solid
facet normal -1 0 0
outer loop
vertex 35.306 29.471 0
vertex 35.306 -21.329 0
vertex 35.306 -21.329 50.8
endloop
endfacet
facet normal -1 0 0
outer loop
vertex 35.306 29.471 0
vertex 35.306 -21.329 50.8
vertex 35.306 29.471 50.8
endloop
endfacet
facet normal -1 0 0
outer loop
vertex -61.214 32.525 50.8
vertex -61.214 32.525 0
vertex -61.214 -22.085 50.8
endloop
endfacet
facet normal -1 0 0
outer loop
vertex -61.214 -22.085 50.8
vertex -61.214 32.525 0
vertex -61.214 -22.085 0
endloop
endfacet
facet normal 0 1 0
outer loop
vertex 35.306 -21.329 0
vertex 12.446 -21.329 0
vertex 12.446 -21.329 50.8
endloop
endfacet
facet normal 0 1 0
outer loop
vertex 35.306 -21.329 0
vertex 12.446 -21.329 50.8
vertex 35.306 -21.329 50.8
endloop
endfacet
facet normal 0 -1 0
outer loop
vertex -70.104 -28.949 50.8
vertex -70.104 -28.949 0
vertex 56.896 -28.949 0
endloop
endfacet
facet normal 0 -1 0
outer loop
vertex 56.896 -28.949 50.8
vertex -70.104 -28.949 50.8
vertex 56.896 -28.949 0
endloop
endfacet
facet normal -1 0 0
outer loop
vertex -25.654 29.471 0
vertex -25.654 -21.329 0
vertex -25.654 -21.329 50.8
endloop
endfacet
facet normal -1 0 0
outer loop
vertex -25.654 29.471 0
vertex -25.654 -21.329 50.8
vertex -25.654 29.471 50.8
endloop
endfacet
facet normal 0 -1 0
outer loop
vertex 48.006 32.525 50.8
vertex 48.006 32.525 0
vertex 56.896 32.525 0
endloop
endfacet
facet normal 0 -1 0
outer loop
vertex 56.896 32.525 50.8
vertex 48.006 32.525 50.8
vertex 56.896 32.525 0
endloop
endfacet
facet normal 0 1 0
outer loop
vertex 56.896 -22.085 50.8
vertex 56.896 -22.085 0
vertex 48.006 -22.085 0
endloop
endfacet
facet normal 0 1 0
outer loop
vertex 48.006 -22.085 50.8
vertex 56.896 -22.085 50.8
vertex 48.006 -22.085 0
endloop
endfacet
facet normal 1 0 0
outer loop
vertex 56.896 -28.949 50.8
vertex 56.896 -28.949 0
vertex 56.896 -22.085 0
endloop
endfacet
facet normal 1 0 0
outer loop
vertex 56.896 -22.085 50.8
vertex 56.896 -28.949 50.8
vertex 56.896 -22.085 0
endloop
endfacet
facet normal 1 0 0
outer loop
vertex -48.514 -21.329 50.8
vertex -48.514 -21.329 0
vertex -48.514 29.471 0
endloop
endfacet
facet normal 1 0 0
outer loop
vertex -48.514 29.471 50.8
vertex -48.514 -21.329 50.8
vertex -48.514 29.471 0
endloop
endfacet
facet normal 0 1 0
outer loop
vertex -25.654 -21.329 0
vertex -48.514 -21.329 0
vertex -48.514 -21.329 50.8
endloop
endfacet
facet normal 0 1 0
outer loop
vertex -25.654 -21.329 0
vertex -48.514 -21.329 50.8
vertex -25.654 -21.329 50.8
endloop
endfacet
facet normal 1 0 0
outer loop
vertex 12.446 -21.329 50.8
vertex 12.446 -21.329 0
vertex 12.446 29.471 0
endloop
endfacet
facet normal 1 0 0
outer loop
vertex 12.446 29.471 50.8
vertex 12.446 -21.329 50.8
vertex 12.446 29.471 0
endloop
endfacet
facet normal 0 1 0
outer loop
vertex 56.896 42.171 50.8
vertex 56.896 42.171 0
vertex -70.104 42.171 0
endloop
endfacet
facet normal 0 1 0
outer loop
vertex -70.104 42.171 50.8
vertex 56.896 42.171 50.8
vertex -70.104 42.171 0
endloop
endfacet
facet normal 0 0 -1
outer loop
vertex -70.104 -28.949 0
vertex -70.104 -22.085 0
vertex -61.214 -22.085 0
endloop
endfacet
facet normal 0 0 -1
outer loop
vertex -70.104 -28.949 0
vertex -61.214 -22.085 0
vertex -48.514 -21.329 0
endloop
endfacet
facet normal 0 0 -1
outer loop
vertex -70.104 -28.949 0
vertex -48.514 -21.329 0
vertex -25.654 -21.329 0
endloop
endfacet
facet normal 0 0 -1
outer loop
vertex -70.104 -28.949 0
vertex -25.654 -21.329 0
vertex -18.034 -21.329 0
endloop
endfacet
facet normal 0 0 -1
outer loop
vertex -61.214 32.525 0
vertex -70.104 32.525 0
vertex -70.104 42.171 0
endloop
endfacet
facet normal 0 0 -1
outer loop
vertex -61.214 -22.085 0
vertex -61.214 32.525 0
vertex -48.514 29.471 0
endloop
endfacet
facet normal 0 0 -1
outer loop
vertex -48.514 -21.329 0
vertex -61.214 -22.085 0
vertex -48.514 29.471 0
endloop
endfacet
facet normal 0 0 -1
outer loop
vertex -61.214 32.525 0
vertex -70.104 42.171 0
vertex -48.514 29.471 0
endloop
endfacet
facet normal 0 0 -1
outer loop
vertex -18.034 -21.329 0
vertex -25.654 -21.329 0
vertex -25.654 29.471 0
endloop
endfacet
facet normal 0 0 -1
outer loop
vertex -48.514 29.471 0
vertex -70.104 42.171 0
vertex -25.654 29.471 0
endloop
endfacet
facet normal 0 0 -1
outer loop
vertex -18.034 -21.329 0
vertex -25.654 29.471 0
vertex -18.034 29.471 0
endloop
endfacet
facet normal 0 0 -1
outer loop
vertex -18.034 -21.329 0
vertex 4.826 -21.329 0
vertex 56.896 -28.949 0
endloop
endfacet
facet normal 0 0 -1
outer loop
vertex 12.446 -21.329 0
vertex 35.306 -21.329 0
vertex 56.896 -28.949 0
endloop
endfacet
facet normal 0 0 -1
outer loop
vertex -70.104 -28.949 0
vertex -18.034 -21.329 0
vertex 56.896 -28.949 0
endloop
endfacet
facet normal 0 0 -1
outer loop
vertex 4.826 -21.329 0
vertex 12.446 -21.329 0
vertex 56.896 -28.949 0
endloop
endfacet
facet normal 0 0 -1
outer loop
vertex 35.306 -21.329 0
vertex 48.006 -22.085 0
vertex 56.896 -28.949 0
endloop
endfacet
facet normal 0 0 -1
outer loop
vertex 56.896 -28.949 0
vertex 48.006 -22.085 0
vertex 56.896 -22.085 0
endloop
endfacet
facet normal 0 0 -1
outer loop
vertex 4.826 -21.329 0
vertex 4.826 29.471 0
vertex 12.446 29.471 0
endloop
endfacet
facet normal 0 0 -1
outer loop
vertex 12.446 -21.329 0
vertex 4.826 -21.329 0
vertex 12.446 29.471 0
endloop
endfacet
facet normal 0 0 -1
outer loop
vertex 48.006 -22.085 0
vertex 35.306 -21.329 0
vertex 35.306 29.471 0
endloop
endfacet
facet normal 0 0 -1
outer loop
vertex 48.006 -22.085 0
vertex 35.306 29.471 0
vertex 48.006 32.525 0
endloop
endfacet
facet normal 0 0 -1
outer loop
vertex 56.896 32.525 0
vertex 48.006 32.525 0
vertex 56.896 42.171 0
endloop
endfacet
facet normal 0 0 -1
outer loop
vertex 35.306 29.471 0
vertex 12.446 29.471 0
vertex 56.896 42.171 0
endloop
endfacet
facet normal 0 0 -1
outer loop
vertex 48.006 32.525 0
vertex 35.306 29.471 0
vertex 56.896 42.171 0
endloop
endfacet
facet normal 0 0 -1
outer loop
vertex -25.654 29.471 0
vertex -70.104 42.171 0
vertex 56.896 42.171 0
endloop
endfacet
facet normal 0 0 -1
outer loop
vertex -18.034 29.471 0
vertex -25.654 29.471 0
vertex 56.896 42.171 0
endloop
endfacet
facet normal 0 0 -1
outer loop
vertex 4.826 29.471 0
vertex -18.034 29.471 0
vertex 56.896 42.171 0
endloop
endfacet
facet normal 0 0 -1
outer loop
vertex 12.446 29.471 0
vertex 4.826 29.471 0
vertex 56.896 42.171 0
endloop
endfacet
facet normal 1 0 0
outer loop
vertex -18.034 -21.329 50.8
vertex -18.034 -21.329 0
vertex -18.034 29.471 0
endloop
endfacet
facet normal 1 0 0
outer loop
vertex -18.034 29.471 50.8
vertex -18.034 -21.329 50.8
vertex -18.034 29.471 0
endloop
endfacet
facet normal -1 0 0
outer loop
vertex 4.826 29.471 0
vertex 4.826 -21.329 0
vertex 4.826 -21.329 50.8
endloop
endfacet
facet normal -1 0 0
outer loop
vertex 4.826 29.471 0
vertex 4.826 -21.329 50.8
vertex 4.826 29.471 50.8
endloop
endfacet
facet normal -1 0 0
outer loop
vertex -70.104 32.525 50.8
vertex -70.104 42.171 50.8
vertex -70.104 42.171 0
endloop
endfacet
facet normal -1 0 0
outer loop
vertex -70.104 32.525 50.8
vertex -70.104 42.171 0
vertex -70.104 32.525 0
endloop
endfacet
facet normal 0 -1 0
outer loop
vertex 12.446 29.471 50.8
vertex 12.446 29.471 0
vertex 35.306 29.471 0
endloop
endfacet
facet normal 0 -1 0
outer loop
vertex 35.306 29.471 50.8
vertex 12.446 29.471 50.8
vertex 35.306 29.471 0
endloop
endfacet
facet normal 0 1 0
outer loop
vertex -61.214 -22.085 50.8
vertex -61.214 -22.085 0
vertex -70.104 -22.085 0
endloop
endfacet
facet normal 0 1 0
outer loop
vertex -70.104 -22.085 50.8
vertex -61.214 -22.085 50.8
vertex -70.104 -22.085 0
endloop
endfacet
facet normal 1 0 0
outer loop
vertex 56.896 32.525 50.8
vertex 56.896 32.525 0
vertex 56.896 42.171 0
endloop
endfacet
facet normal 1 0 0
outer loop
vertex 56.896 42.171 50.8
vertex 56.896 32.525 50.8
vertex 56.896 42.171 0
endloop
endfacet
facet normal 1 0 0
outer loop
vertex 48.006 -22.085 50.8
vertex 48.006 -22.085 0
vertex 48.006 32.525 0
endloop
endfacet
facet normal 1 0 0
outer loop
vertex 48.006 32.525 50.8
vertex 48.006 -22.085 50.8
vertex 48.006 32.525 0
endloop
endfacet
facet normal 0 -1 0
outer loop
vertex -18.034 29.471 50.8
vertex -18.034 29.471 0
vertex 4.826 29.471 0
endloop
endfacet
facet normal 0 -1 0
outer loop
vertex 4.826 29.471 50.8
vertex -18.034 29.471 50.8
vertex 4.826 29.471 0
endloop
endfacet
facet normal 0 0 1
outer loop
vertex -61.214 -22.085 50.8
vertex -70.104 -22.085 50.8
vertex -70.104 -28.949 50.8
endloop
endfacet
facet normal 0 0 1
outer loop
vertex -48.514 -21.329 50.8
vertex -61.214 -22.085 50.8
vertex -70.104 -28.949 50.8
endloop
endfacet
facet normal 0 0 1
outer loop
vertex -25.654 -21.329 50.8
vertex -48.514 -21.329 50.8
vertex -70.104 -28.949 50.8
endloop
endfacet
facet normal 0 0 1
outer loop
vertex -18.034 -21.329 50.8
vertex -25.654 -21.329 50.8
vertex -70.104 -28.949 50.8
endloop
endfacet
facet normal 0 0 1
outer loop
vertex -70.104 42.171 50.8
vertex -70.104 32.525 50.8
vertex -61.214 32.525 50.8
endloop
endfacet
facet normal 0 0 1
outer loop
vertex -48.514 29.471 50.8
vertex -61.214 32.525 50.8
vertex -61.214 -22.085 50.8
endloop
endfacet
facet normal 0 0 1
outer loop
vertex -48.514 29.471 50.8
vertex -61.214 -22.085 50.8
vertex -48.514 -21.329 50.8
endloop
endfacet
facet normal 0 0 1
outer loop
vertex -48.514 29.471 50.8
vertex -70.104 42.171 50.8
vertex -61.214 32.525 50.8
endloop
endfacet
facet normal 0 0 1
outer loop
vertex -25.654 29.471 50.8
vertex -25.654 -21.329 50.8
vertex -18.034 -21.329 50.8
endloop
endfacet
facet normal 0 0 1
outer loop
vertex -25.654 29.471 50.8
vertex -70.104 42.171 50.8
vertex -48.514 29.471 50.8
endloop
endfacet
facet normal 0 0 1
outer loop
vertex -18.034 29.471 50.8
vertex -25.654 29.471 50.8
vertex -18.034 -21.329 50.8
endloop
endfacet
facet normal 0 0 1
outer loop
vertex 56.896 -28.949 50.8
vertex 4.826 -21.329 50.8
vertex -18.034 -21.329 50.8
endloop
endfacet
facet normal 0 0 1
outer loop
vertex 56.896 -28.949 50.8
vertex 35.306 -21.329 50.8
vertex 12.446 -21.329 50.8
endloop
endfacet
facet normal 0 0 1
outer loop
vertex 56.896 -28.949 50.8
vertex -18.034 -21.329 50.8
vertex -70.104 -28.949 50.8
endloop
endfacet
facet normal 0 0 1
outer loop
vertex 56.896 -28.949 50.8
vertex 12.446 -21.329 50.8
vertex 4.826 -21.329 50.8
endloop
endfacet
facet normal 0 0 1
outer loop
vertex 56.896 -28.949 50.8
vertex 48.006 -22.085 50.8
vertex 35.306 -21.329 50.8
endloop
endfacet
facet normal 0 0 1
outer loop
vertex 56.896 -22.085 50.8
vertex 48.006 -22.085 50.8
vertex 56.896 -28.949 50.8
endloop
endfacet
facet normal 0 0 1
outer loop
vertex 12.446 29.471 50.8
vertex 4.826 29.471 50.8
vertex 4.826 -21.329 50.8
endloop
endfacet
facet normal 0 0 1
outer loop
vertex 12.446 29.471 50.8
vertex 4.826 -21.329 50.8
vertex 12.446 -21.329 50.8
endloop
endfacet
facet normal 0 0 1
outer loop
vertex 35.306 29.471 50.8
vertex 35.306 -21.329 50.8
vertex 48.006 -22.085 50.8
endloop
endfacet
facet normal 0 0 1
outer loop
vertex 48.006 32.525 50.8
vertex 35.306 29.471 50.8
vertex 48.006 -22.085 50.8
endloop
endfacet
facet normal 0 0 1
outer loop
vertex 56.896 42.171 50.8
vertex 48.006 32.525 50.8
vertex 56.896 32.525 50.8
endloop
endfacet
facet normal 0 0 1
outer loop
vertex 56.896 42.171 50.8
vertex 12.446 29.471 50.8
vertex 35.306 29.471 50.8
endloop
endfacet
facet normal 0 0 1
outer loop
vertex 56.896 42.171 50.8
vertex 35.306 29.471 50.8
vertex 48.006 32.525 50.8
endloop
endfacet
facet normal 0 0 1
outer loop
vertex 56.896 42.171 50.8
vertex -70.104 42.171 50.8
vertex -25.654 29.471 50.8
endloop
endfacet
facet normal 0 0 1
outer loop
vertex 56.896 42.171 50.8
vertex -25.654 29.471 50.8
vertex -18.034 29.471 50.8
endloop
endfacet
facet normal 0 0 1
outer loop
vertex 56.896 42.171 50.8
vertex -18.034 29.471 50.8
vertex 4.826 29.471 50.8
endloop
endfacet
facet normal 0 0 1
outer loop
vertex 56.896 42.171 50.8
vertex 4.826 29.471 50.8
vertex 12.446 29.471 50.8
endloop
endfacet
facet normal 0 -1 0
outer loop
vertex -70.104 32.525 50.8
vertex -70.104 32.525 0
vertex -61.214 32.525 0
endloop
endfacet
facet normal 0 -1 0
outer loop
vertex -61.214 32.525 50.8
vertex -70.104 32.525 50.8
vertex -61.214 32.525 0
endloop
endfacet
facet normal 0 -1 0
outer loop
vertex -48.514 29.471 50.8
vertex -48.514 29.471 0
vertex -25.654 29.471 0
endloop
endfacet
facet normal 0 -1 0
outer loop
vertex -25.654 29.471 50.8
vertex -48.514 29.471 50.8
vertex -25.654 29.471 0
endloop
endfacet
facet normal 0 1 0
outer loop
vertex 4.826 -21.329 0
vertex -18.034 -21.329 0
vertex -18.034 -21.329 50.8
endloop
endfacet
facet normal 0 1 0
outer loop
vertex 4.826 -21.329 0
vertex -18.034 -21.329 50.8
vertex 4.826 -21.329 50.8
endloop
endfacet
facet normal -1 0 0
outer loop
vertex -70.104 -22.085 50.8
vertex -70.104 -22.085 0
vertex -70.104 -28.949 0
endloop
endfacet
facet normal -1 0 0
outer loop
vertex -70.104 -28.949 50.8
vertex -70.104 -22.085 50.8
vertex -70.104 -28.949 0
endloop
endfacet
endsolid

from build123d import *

# Parameters (mm, degrees)
F0_W     = 22.86
F0_H     = 50.8
F1_DEPTH = 50.8


with BuildPart() as f1:
    # F0 (on Top) → F1 (new body)
    with BuildSketch(Plane.XY):
        Polygon((56.896489, 42.170627), (-6.603511, 42.170627), (-70.103511, 42.170627), (-70.103511, 32.525493), (-61.213511, 32.525493), (-61.213511, -22.084507), (-70.103511, -22.084507), (-70.103511, -28.949373), (56.896489, -28.949373), (56.896489, -22.084507), (48.006489, -22.084507), (48.006489, 32.525493), (56.896489, 32.525493), align=None)
        with Locations((-37.083511, 4.070627)):
            Rectangle(F0_W, F0_H, mode=Mode.SUBTRACT)
        with Locations((-6.603511, 4.070627)):
            Rectangle(F0_W, F0_H, mode=Mode.SUBTRACT)
        with Locations((23.876489, 4.070627)):
            Rectangle(F0_W, F0_H, mode=Mode.SUBTRACT)
    extrude(amount=F1_DEPTH)


solid = f1.part
